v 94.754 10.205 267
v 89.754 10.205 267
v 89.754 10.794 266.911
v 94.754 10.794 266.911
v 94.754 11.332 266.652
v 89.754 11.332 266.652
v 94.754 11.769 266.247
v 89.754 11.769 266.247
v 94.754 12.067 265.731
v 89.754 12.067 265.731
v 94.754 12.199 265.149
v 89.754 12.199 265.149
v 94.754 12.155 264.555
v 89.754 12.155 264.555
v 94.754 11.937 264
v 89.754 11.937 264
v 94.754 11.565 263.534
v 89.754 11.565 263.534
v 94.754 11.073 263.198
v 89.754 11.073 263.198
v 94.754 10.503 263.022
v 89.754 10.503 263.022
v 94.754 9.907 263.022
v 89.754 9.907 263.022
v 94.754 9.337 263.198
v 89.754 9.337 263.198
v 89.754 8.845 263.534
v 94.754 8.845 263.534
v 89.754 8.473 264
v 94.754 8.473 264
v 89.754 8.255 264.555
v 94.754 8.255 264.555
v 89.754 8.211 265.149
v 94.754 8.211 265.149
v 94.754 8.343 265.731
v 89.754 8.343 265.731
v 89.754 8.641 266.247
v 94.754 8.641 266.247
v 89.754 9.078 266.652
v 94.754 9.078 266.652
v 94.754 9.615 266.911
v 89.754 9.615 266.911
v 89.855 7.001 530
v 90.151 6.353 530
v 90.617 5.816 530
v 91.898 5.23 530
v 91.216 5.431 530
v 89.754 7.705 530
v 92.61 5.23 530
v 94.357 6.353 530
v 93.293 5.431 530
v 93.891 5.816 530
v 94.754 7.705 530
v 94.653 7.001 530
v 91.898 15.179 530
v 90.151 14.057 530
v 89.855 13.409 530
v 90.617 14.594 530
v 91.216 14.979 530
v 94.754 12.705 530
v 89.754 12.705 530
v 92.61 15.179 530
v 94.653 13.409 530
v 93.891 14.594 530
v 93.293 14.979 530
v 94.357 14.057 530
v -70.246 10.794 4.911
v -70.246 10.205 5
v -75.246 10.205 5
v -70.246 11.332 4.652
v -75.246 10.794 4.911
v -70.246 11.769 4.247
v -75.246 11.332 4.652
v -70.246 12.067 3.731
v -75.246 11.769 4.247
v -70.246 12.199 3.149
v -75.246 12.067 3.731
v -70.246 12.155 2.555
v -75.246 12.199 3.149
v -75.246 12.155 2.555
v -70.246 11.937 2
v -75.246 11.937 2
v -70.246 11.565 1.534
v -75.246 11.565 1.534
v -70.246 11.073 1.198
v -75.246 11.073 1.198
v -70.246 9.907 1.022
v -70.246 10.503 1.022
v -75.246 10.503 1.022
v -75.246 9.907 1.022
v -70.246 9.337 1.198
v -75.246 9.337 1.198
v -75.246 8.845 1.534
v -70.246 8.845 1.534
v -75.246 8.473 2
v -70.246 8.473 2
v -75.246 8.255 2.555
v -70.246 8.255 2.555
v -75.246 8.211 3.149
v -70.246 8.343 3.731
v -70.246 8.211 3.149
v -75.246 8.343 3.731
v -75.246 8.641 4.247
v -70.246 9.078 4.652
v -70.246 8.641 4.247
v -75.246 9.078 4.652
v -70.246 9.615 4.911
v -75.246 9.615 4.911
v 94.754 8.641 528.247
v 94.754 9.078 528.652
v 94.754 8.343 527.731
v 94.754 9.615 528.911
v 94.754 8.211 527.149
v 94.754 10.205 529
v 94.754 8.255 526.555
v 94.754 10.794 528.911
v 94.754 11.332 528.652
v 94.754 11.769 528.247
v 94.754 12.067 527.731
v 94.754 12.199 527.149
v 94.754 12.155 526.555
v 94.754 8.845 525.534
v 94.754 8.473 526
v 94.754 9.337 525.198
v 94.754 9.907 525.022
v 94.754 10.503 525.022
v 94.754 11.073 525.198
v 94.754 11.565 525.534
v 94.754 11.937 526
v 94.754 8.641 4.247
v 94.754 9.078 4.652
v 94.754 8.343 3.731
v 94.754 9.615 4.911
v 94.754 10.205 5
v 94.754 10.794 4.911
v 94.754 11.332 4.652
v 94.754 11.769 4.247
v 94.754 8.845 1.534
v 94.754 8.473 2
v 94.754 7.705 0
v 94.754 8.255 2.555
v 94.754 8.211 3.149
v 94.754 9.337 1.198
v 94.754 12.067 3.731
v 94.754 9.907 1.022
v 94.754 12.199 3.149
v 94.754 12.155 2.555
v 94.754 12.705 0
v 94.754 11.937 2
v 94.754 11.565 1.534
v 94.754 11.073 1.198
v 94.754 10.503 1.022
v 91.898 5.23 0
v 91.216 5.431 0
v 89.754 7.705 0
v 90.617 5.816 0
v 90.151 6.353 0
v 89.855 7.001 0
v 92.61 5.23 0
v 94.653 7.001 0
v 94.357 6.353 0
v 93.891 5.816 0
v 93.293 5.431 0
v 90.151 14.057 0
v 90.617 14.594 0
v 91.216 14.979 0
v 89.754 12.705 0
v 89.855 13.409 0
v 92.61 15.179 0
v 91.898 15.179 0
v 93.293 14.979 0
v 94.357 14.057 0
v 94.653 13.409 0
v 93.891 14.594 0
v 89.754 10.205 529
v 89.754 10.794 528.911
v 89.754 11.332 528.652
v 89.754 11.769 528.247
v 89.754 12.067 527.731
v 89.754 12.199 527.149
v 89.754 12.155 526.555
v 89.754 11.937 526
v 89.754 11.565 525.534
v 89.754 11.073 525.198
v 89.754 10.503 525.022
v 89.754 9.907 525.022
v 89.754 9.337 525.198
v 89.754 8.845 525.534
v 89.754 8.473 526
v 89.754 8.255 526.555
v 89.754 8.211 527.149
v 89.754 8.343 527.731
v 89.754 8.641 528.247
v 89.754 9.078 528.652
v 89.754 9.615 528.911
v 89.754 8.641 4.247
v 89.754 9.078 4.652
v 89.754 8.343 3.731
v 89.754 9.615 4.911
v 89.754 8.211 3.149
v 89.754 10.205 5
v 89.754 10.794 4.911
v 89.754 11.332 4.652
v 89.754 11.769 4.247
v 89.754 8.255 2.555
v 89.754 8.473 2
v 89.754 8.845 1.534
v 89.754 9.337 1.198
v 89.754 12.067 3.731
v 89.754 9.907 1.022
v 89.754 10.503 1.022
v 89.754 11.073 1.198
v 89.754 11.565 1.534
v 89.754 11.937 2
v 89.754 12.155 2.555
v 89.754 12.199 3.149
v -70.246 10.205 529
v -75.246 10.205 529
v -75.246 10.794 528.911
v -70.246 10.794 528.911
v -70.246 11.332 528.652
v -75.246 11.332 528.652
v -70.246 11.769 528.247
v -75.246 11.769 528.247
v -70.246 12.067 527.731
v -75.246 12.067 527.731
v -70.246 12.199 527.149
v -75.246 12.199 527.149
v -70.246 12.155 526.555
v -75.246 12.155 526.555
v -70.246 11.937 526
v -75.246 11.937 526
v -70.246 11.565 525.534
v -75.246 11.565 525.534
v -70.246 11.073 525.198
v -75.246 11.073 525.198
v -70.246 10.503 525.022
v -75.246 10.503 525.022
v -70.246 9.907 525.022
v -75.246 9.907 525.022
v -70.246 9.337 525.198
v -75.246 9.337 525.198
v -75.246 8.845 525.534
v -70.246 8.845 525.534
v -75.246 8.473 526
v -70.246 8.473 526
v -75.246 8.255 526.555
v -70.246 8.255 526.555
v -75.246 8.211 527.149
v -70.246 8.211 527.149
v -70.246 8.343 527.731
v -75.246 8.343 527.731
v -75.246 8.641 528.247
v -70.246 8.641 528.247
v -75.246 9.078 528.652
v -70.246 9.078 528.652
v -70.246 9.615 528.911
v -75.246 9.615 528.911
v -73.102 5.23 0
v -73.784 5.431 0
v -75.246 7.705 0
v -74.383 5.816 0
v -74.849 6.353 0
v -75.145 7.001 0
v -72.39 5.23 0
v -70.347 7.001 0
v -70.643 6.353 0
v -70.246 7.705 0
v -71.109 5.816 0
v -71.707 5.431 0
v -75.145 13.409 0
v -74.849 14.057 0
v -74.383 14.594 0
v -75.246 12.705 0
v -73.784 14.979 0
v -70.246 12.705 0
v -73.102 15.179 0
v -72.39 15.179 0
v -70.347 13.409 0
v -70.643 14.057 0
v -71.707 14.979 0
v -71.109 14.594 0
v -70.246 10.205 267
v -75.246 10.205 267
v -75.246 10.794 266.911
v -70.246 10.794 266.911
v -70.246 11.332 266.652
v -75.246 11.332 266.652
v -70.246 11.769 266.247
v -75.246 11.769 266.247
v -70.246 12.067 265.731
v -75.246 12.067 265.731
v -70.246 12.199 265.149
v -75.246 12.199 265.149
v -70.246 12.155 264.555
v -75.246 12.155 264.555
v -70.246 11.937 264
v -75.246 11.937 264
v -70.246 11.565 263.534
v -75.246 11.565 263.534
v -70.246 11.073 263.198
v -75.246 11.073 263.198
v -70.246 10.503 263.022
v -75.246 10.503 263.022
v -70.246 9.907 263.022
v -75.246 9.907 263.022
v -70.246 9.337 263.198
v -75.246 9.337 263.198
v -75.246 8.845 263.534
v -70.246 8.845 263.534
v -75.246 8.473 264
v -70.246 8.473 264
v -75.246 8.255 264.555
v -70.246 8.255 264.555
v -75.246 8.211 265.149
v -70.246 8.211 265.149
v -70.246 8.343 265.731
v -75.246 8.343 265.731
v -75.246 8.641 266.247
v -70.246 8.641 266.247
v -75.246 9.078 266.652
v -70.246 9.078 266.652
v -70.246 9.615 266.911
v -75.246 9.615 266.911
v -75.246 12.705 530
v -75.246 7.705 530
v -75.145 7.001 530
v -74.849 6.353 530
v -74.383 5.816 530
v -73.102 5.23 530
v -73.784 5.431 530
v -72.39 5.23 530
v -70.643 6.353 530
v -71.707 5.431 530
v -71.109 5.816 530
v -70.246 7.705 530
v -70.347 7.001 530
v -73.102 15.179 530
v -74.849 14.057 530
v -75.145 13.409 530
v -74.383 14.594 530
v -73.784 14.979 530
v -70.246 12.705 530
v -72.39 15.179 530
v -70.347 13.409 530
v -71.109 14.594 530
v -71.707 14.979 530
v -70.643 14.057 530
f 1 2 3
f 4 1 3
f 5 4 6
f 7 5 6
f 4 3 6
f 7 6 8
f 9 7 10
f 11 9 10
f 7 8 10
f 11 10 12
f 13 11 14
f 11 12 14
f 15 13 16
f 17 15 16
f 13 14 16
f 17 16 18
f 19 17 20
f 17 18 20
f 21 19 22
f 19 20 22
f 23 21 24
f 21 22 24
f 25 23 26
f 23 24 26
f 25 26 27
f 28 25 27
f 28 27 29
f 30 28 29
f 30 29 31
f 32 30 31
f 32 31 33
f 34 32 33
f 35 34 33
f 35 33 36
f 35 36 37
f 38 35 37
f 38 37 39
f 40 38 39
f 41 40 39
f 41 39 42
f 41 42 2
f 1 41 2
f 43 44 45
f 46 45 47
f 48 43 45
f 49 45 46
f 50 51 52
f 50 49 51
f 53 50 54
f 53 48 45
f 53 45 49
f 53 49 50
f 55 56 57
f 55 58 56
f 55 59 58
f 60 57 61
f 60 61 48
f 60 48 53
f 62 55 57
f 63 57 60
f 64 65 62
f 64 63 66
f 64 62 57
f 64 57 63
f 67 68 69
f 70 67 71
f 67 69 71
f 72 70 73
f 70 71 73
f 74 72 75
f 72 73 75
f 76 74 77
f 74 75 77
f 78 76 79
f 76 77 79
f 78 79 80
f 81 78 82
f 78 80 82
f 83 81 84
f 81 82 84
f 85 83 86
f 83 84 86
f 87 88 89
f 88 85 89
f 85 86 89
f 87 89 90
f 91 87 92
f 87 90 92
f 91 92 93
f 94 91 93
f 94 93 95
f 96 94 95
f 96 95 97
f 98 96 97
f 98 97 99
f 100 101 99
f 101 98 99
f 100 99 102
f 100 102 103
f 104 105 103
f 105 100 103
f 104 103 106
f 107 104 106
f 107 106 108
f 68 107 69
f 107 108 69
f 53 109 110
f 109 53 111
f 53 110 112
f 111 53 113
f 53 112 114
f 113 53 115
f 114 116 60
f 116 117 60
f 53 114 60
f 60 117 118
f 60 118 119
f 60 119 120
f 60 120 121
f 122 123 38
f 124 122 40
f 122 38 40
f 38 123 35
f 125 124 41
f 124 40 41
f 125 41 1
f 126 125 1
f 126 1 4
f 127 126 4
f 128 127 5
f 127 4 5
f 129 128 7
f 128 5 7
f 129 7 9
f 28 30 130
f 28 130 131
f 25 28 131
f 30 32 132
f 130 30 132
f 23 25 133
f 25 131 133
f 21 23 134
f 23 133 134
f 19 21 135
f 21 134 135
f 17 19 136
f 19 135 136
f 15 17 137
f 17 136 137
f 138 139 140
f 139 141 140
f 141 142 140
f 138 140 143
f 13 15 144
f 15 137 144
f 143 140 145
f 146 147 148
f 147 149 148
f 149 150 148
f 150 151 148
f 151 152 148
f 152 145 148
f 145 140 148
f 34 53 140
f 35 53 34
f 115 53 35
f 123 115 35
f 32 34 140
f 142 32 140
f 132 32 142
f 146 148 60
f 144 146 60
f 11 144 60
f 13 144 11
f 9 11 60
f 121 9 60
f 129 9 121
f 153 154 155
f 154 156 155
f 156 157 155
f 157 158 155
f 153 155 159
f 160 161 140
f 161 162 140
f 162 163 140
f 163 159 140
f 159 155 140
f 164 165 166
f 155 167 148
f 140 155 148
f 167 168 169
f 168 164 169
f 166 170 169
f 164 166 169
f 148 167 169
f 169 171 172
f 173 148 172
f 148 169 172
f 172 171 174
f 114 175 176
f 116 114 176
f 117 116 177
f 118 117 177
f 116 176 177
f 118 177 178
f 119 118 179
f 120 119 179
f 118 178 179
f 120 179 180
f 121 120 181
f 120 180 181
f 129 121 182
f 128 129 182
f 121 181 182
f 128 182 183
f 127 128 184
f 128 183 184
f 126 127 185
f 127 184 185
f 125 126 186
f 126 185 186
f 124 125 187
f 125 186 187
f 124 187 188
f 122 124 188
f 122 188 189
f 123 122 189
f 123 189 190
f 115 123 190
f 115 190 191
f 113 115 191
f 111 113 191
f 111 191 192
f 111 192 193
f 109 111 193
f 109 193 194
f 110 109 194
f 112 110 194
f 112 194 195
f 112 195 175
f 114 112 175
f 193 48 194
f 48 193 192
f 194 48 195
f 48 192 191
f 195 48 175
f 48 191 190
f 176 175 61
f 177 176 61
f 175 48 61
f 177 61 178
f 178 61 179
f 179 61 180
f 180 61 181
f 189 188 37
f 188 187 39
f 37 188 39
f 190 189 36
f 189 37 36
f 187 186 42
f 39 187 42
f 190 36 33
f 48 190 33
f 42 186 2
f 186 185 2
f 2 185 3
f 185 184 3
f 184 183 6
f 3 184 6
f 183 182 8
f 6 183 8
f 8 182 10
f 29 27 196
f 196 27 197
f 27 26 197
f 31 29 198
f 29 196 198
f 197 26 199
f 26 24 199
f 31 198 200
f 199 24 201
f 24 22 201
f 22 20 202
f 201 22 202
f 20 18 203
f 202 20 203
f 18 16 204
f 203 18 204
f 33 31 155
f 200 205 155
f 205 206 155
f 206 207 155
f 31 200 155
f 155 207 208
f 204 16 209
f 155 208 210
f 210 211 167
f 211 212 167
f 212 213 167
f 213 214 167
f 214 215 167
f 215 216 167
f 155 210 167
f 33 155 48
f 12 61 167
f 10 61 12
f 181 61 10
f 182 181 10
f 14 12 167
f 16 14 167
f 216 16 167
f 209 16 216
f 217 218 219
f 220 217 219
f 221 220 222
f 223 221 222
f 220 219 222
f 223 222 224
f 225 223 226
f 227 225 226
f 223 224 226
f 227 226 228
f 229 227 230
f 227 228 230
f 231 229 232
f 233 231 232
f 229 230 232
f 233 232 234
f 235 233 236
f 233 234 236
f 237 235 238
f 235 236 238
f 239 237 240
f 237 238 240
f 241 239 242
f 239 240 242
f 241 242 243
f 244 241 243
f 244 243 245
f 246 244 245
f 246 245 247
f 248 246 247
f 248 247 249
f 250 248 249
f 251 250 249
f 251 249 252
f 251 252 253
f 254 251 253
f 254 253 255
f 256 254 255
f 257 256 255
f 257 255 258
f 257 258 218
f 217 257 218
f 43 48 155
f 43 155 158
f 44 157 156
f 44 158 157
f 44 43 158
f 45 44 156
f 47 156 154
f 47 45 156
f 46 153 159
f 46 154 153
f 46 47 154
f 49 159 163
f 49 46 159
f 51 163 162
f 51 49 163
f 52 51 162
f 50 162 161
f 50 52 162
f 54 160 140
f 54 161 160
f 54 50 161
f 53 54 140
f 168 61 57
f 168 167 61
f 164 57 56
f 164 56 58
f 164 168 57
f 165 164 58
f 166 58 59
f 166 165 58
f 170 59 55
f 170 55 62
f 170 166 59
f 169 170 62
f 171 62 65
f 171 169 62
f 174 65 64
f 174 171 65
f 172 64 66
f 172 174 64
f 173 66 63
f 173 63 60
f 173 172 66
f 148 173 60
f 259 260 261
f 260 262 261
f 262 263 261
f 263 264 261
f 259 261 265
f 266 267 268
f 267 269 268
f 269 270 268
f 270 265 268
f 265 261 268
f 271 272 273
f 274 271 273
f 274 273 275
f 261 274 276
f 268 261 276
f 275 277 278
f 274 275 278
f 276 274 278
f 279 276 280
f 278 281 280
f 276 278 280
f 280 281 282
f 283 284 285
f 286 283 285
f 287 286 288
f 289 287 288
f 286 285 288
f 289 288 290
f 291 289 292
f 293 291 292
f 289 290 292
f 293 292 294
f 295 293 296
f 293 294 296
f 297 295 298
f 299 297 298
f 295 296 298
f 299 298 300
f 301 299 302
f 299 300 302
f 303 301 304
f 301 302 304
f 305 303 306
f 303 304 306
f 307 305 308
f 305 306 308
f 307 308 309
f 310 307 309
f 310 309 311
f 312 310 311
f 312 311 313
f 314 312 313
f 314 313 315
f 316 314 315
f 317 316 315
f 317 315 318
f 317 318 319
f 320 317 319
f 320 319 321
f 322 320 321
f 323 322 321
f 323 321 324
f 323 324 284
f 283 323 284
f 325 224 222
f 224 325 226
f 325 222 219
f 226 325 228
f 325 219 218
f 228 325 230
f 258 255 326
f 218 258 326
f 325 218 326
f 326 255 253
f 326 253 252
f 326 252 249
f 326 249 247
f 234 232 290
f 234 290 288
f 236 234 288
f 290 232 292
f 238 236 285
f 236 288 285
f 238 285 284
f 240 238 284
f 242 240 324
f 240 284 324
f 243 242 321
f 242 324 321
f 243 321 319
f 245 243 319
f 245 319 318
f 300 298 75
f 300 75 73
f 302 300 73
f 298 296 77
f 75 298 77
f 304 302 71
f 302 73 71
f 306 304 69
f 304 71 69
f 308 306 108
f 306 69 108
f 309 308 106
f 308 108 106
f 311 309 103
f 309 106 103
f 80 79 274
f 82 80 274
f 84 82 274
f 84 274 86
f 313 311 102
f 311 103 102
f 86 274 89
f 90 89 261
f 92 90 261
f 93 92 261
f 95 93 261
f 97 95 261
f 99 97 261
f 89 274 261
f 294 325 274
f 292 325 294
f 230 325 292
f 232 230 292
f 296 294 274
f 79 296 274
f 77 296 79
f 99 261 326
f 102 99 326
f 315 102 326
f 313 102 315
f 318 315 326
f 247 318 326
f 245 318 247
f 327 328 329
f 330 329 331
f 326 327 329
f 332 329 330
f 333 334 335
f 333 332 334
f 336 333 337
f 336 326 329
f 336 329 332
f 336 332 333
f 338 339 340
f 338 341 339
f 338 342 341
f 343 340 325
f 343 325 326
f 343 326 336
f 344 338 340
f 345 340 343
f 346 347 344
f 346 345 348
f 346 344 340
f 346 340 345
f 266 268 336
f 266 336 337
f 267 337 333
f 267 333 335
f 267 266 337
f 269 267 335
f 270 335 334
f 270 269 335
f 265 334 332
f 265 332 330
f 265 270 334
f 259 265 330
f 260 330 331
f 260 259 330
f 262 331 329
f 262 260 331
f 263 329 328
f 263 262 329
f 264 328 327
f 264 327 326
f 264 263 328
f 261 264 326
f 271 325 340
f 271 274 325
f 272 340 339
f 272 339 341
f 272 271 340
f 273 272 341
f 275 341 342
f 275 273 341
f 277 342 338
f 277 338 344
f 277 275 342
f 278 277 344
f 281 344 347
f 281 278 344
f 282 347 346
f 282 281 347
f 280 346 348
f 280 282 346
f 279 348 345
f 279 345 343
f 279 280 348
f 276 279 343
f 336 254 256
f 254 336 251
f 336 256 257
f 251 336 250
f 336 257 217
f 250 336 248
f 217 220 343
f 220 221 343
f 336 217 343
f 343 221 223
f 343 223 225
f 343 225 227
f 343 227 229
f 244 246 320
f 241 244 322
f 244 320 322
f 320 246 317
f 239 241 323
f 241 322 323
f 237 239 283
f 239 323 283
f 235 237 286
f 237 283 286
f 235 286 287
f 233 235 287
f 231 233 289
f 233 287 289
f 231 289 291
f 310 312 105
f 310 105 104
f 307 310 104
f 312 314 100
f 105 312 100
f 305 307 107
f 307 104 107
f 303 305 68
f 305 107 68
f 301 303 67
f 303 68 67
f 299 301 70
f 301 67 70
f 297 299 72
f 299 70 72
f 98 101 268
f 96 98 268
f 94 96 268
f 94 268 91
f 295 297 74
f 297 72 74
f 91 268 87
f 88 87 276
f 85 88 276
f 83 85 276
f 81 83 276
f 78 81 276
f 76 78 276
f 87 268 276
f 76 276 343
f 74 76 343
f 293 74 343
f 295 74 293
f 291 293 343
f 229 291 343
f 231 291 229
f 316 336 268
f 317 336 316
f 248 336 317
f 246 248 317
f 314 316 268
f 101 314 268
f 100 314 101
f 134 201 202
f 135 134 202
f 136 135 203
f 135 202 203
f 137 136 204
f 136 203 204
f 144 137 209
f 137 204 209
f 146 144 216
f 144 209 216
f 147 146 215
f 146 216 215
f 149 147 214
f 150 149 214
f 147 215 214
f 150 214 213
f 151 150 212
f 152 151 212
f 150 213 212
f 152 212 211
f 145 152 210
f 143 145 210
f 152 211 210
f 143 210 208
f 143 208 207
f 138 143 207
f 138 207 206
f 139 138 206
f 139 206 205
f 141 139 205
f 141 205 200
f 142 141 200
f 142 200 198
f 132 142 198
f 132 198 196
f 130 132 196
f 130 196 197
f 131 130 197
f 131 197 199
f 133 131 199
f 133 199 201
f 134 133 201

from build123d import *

# Parameters (mm, degrees)
BOSS_EXTRUDE1_DEPTH   = 100
BOSS_EXTRUDE2_DEPTH   = 430
F_4_0MM_DOWEL_HOLE7_D = 4
SKETCH6_W             = 160
SKETCH6_H             = 100
CUT_EXTRUDE1_DEPTH    = 10
FILLET1_RADIUS        = 2.5
FILLET1_LENGTH        = 530
FILLET2_RADIUS        = 2.5
FILLET2_LENGTH        = 530
FILLET4_RADIUS        = 2.5
FILLET4_LENGTH        = 530
FILLET5_RADIUS        = 2.5
FILLET5_LENGTH        = 530


with BuildPart() as part:
    # Sketch1 → Boss-Extrude1 (new body)
    with BuildSketch(Plane.XY):
        Polygon((-75.245901639, 15.204918033), (-75.245901639, 5.204918033), (94.754098361, 5.204918033), (94.754098361, 15.204918033), (89.754098361, 15.204918033), (89.754098361, 10.204918033), (-70.245901639, 10.204918033), (-70.245901639, 15.204918033), align=None)
    extrude(amount=BOSS_EXTRUDE1_DEPTH)

    # Sketch2 → Boss-Extrude2 (add)
    with BuildSketch(Plane.XY.offset(100)):
        Polygon((-75.245901639, 15.204918033), (-75.245901639, 5.204918033), (-70.245901639, 5.204918033), (-70.245901639, 10.204918033), (-70.245901639, 15.204918033), align=None)
        Polygon((89.754098361, 15.204918033), (89.754098361, 10.204918033), (89.754098361, 5.204918033), (94.754098361, 5.204918033), (94.754098361, 15.204918033), align=None)
    extrude(amount=BOSS_EXTRUDE2_DEPTH)

    # Ø4.0mm Dowel Hole7 (through all)
    with Locations(Plane(origin=(94.754098361, 0, 0), x_dir=(0, 0, -1), z_dir=(1, 0, 0))):
        with Locations((-527, 10.204918033), (-265, 10.204918033), (-3, 10.204918033)):
            Hole(F_4_0MM_DOWEL_HOLE7_D / 2)

    # Sketch6 → Cut-Extrude1 (cut)
    with BuildSketch(Plane(origin=(0, 10.204918033, 0), x_dir=(1, 0, 0), z_dir=(0, 1, 0))):
        with Locations((9.754098361, -50)):
            Rectangle(SKETCH6_W, SKETCH6_H)
    extrude(amount=-CUT_EXTRUDE1_DEPTH, mode=Mode.SUBTRACT)


with BuildPart() as cut_extrude1_piece_1:
    # of the separate pieces the step leaves, piece 1, a body of its own (cut_extrude1_pieces)
    add(part.part.solids().sort_by_distance((-75.245901639, 15.204918033, 530))[0])

    # Fillet4: full round fillet: the end face becomes a half cylinder, R = half its width
    fillet4_face = Plane((-72.745901639, 15.204918033, 265), x_dir=(0, 0, -1), z_dir=(0, 1, 0))  # on the end face: x along it, z out of the body
    fillet4_slab = fillet4_face.offset(-FILLET4_RADIUS / 2) * Box(FILLET4_LENGTH, 2 * FILLET4_RADIUS, FILLET4_RADIUS, mode=Mode.PRIVATE)  # the body's end, R deep
    fillet4_round = Plane((-72.745901639, 12.704918033, 265), x_dir=(0, 1, 0), z_dir=(0, 0, -1)) * Cylinder(FILLET4_RADIUS, FILLET4_LENGTH, mode=Mode.PRIVATE)  # its axis R under the face
    add(fillet4_slab - fillet4_round, mode=Mode.SUBTRACT)

    # Fillet5: full round fillet: the end face becomes a half cylinder, R = half its width
    fillet5_face = Plane((-72.745901639, 5.204918033, 265), x_dir=(0, 0, -1), z_dir=(0, -1, 0))  # on the end face: x along it, z out of the body
    fillet5_slab = fillet5_face.offset(-FILLET5_RADIUS / 2) * Box(FILLET5_LENGTH, 2 * FILLET5_RADIUS, FILLET5_RADIUS, mode=Mode.PRIVATE)  # the body's end, R deep
    fillet5_round = Plane((-72.745901639, 7.704918033, 265), x_dir=(0, -1, 0), z_dir=(0, 0, -1)) * Cylinder(FILLET5_RADIUS, FILLET5_LENGTH, mode=Mode.PRIVATE)  # its axis R under the face
    add(fillet5_slab - fillet5_round, mode=Mode.SUBTRACT)


with BuildPart() as cut_extrude1_piece_2:
    # of the separate pieces the step leaves, piece 2, a body of its own (cut_extrude1_pieces)
    add(part.part.solids().sort_by_distance((89.754098361, 5.204918033, 0))[0])

    # Fillet1: full round fillet: the end face becomes a half cylinder, R = half its width
    fillet1_face = Plane((92.254098361, 15.204918033, 265), x_dir=(0, 0, -1), z_dir=(0, 1, 0))  # on the end face: x along it, z out of the body
    fillet1_slab = fillet1_face.offset(-FILLET1_RADIUS / 2) * Box(FILLET1_LENGTH, 2 * FILLET1_RADIUS, FILLET1_RADIUS, mode=Mode.PRIVATE)  # the body's end, R deep
    fillet1_round = Plane((92.254098361, 12.704918033, 265), x_dir=(0, 1, 0), z_dir=(0, 0, -1)) * Cylinder(FILLET1_RADIUS, FILLET1_LENGTH, mode=Mode.PRIVATE)  # its axis R under the face
    add(fillet1_slab - fillet1_round, mode=Mode.SUBTRACT)

    # Fillet2: full round fillet: the end face becomes a half cylinder, R = half its width
    fillet2_face = Plane((92.254098361, 5.204918033, 265), x_dir=(0, 0, 1), z_dir=(0, -1, 0))  # on the end face: x along it, z out of the body
    fillet2_slab = fillet2_face.offset(-FILLET2_RADIUS / 2) * Box(FILLET2_LENGTH, 2 * FILLET2_RADIUS, FILLET2_RADIUS, mode=Mode.PRIVATE)  # the body's end, R deep
    fillet2_round = Plane((92.254098361, 7.704918033, 265), x_dir=(0, -1, 0), z_dir=(0, 0, 1)) * Cylinder(FILLET2_RADIUS, FILLET2_LENGTH, mode=Mode.PRIVATE)  # its axis R under the face
    add(fillet2_slab - fillet2_round, mode=Mode.SUBTRACT)


solid = Compound([cut_extrude1_piece_1.part, cut_extrude1_piece_2.part])
